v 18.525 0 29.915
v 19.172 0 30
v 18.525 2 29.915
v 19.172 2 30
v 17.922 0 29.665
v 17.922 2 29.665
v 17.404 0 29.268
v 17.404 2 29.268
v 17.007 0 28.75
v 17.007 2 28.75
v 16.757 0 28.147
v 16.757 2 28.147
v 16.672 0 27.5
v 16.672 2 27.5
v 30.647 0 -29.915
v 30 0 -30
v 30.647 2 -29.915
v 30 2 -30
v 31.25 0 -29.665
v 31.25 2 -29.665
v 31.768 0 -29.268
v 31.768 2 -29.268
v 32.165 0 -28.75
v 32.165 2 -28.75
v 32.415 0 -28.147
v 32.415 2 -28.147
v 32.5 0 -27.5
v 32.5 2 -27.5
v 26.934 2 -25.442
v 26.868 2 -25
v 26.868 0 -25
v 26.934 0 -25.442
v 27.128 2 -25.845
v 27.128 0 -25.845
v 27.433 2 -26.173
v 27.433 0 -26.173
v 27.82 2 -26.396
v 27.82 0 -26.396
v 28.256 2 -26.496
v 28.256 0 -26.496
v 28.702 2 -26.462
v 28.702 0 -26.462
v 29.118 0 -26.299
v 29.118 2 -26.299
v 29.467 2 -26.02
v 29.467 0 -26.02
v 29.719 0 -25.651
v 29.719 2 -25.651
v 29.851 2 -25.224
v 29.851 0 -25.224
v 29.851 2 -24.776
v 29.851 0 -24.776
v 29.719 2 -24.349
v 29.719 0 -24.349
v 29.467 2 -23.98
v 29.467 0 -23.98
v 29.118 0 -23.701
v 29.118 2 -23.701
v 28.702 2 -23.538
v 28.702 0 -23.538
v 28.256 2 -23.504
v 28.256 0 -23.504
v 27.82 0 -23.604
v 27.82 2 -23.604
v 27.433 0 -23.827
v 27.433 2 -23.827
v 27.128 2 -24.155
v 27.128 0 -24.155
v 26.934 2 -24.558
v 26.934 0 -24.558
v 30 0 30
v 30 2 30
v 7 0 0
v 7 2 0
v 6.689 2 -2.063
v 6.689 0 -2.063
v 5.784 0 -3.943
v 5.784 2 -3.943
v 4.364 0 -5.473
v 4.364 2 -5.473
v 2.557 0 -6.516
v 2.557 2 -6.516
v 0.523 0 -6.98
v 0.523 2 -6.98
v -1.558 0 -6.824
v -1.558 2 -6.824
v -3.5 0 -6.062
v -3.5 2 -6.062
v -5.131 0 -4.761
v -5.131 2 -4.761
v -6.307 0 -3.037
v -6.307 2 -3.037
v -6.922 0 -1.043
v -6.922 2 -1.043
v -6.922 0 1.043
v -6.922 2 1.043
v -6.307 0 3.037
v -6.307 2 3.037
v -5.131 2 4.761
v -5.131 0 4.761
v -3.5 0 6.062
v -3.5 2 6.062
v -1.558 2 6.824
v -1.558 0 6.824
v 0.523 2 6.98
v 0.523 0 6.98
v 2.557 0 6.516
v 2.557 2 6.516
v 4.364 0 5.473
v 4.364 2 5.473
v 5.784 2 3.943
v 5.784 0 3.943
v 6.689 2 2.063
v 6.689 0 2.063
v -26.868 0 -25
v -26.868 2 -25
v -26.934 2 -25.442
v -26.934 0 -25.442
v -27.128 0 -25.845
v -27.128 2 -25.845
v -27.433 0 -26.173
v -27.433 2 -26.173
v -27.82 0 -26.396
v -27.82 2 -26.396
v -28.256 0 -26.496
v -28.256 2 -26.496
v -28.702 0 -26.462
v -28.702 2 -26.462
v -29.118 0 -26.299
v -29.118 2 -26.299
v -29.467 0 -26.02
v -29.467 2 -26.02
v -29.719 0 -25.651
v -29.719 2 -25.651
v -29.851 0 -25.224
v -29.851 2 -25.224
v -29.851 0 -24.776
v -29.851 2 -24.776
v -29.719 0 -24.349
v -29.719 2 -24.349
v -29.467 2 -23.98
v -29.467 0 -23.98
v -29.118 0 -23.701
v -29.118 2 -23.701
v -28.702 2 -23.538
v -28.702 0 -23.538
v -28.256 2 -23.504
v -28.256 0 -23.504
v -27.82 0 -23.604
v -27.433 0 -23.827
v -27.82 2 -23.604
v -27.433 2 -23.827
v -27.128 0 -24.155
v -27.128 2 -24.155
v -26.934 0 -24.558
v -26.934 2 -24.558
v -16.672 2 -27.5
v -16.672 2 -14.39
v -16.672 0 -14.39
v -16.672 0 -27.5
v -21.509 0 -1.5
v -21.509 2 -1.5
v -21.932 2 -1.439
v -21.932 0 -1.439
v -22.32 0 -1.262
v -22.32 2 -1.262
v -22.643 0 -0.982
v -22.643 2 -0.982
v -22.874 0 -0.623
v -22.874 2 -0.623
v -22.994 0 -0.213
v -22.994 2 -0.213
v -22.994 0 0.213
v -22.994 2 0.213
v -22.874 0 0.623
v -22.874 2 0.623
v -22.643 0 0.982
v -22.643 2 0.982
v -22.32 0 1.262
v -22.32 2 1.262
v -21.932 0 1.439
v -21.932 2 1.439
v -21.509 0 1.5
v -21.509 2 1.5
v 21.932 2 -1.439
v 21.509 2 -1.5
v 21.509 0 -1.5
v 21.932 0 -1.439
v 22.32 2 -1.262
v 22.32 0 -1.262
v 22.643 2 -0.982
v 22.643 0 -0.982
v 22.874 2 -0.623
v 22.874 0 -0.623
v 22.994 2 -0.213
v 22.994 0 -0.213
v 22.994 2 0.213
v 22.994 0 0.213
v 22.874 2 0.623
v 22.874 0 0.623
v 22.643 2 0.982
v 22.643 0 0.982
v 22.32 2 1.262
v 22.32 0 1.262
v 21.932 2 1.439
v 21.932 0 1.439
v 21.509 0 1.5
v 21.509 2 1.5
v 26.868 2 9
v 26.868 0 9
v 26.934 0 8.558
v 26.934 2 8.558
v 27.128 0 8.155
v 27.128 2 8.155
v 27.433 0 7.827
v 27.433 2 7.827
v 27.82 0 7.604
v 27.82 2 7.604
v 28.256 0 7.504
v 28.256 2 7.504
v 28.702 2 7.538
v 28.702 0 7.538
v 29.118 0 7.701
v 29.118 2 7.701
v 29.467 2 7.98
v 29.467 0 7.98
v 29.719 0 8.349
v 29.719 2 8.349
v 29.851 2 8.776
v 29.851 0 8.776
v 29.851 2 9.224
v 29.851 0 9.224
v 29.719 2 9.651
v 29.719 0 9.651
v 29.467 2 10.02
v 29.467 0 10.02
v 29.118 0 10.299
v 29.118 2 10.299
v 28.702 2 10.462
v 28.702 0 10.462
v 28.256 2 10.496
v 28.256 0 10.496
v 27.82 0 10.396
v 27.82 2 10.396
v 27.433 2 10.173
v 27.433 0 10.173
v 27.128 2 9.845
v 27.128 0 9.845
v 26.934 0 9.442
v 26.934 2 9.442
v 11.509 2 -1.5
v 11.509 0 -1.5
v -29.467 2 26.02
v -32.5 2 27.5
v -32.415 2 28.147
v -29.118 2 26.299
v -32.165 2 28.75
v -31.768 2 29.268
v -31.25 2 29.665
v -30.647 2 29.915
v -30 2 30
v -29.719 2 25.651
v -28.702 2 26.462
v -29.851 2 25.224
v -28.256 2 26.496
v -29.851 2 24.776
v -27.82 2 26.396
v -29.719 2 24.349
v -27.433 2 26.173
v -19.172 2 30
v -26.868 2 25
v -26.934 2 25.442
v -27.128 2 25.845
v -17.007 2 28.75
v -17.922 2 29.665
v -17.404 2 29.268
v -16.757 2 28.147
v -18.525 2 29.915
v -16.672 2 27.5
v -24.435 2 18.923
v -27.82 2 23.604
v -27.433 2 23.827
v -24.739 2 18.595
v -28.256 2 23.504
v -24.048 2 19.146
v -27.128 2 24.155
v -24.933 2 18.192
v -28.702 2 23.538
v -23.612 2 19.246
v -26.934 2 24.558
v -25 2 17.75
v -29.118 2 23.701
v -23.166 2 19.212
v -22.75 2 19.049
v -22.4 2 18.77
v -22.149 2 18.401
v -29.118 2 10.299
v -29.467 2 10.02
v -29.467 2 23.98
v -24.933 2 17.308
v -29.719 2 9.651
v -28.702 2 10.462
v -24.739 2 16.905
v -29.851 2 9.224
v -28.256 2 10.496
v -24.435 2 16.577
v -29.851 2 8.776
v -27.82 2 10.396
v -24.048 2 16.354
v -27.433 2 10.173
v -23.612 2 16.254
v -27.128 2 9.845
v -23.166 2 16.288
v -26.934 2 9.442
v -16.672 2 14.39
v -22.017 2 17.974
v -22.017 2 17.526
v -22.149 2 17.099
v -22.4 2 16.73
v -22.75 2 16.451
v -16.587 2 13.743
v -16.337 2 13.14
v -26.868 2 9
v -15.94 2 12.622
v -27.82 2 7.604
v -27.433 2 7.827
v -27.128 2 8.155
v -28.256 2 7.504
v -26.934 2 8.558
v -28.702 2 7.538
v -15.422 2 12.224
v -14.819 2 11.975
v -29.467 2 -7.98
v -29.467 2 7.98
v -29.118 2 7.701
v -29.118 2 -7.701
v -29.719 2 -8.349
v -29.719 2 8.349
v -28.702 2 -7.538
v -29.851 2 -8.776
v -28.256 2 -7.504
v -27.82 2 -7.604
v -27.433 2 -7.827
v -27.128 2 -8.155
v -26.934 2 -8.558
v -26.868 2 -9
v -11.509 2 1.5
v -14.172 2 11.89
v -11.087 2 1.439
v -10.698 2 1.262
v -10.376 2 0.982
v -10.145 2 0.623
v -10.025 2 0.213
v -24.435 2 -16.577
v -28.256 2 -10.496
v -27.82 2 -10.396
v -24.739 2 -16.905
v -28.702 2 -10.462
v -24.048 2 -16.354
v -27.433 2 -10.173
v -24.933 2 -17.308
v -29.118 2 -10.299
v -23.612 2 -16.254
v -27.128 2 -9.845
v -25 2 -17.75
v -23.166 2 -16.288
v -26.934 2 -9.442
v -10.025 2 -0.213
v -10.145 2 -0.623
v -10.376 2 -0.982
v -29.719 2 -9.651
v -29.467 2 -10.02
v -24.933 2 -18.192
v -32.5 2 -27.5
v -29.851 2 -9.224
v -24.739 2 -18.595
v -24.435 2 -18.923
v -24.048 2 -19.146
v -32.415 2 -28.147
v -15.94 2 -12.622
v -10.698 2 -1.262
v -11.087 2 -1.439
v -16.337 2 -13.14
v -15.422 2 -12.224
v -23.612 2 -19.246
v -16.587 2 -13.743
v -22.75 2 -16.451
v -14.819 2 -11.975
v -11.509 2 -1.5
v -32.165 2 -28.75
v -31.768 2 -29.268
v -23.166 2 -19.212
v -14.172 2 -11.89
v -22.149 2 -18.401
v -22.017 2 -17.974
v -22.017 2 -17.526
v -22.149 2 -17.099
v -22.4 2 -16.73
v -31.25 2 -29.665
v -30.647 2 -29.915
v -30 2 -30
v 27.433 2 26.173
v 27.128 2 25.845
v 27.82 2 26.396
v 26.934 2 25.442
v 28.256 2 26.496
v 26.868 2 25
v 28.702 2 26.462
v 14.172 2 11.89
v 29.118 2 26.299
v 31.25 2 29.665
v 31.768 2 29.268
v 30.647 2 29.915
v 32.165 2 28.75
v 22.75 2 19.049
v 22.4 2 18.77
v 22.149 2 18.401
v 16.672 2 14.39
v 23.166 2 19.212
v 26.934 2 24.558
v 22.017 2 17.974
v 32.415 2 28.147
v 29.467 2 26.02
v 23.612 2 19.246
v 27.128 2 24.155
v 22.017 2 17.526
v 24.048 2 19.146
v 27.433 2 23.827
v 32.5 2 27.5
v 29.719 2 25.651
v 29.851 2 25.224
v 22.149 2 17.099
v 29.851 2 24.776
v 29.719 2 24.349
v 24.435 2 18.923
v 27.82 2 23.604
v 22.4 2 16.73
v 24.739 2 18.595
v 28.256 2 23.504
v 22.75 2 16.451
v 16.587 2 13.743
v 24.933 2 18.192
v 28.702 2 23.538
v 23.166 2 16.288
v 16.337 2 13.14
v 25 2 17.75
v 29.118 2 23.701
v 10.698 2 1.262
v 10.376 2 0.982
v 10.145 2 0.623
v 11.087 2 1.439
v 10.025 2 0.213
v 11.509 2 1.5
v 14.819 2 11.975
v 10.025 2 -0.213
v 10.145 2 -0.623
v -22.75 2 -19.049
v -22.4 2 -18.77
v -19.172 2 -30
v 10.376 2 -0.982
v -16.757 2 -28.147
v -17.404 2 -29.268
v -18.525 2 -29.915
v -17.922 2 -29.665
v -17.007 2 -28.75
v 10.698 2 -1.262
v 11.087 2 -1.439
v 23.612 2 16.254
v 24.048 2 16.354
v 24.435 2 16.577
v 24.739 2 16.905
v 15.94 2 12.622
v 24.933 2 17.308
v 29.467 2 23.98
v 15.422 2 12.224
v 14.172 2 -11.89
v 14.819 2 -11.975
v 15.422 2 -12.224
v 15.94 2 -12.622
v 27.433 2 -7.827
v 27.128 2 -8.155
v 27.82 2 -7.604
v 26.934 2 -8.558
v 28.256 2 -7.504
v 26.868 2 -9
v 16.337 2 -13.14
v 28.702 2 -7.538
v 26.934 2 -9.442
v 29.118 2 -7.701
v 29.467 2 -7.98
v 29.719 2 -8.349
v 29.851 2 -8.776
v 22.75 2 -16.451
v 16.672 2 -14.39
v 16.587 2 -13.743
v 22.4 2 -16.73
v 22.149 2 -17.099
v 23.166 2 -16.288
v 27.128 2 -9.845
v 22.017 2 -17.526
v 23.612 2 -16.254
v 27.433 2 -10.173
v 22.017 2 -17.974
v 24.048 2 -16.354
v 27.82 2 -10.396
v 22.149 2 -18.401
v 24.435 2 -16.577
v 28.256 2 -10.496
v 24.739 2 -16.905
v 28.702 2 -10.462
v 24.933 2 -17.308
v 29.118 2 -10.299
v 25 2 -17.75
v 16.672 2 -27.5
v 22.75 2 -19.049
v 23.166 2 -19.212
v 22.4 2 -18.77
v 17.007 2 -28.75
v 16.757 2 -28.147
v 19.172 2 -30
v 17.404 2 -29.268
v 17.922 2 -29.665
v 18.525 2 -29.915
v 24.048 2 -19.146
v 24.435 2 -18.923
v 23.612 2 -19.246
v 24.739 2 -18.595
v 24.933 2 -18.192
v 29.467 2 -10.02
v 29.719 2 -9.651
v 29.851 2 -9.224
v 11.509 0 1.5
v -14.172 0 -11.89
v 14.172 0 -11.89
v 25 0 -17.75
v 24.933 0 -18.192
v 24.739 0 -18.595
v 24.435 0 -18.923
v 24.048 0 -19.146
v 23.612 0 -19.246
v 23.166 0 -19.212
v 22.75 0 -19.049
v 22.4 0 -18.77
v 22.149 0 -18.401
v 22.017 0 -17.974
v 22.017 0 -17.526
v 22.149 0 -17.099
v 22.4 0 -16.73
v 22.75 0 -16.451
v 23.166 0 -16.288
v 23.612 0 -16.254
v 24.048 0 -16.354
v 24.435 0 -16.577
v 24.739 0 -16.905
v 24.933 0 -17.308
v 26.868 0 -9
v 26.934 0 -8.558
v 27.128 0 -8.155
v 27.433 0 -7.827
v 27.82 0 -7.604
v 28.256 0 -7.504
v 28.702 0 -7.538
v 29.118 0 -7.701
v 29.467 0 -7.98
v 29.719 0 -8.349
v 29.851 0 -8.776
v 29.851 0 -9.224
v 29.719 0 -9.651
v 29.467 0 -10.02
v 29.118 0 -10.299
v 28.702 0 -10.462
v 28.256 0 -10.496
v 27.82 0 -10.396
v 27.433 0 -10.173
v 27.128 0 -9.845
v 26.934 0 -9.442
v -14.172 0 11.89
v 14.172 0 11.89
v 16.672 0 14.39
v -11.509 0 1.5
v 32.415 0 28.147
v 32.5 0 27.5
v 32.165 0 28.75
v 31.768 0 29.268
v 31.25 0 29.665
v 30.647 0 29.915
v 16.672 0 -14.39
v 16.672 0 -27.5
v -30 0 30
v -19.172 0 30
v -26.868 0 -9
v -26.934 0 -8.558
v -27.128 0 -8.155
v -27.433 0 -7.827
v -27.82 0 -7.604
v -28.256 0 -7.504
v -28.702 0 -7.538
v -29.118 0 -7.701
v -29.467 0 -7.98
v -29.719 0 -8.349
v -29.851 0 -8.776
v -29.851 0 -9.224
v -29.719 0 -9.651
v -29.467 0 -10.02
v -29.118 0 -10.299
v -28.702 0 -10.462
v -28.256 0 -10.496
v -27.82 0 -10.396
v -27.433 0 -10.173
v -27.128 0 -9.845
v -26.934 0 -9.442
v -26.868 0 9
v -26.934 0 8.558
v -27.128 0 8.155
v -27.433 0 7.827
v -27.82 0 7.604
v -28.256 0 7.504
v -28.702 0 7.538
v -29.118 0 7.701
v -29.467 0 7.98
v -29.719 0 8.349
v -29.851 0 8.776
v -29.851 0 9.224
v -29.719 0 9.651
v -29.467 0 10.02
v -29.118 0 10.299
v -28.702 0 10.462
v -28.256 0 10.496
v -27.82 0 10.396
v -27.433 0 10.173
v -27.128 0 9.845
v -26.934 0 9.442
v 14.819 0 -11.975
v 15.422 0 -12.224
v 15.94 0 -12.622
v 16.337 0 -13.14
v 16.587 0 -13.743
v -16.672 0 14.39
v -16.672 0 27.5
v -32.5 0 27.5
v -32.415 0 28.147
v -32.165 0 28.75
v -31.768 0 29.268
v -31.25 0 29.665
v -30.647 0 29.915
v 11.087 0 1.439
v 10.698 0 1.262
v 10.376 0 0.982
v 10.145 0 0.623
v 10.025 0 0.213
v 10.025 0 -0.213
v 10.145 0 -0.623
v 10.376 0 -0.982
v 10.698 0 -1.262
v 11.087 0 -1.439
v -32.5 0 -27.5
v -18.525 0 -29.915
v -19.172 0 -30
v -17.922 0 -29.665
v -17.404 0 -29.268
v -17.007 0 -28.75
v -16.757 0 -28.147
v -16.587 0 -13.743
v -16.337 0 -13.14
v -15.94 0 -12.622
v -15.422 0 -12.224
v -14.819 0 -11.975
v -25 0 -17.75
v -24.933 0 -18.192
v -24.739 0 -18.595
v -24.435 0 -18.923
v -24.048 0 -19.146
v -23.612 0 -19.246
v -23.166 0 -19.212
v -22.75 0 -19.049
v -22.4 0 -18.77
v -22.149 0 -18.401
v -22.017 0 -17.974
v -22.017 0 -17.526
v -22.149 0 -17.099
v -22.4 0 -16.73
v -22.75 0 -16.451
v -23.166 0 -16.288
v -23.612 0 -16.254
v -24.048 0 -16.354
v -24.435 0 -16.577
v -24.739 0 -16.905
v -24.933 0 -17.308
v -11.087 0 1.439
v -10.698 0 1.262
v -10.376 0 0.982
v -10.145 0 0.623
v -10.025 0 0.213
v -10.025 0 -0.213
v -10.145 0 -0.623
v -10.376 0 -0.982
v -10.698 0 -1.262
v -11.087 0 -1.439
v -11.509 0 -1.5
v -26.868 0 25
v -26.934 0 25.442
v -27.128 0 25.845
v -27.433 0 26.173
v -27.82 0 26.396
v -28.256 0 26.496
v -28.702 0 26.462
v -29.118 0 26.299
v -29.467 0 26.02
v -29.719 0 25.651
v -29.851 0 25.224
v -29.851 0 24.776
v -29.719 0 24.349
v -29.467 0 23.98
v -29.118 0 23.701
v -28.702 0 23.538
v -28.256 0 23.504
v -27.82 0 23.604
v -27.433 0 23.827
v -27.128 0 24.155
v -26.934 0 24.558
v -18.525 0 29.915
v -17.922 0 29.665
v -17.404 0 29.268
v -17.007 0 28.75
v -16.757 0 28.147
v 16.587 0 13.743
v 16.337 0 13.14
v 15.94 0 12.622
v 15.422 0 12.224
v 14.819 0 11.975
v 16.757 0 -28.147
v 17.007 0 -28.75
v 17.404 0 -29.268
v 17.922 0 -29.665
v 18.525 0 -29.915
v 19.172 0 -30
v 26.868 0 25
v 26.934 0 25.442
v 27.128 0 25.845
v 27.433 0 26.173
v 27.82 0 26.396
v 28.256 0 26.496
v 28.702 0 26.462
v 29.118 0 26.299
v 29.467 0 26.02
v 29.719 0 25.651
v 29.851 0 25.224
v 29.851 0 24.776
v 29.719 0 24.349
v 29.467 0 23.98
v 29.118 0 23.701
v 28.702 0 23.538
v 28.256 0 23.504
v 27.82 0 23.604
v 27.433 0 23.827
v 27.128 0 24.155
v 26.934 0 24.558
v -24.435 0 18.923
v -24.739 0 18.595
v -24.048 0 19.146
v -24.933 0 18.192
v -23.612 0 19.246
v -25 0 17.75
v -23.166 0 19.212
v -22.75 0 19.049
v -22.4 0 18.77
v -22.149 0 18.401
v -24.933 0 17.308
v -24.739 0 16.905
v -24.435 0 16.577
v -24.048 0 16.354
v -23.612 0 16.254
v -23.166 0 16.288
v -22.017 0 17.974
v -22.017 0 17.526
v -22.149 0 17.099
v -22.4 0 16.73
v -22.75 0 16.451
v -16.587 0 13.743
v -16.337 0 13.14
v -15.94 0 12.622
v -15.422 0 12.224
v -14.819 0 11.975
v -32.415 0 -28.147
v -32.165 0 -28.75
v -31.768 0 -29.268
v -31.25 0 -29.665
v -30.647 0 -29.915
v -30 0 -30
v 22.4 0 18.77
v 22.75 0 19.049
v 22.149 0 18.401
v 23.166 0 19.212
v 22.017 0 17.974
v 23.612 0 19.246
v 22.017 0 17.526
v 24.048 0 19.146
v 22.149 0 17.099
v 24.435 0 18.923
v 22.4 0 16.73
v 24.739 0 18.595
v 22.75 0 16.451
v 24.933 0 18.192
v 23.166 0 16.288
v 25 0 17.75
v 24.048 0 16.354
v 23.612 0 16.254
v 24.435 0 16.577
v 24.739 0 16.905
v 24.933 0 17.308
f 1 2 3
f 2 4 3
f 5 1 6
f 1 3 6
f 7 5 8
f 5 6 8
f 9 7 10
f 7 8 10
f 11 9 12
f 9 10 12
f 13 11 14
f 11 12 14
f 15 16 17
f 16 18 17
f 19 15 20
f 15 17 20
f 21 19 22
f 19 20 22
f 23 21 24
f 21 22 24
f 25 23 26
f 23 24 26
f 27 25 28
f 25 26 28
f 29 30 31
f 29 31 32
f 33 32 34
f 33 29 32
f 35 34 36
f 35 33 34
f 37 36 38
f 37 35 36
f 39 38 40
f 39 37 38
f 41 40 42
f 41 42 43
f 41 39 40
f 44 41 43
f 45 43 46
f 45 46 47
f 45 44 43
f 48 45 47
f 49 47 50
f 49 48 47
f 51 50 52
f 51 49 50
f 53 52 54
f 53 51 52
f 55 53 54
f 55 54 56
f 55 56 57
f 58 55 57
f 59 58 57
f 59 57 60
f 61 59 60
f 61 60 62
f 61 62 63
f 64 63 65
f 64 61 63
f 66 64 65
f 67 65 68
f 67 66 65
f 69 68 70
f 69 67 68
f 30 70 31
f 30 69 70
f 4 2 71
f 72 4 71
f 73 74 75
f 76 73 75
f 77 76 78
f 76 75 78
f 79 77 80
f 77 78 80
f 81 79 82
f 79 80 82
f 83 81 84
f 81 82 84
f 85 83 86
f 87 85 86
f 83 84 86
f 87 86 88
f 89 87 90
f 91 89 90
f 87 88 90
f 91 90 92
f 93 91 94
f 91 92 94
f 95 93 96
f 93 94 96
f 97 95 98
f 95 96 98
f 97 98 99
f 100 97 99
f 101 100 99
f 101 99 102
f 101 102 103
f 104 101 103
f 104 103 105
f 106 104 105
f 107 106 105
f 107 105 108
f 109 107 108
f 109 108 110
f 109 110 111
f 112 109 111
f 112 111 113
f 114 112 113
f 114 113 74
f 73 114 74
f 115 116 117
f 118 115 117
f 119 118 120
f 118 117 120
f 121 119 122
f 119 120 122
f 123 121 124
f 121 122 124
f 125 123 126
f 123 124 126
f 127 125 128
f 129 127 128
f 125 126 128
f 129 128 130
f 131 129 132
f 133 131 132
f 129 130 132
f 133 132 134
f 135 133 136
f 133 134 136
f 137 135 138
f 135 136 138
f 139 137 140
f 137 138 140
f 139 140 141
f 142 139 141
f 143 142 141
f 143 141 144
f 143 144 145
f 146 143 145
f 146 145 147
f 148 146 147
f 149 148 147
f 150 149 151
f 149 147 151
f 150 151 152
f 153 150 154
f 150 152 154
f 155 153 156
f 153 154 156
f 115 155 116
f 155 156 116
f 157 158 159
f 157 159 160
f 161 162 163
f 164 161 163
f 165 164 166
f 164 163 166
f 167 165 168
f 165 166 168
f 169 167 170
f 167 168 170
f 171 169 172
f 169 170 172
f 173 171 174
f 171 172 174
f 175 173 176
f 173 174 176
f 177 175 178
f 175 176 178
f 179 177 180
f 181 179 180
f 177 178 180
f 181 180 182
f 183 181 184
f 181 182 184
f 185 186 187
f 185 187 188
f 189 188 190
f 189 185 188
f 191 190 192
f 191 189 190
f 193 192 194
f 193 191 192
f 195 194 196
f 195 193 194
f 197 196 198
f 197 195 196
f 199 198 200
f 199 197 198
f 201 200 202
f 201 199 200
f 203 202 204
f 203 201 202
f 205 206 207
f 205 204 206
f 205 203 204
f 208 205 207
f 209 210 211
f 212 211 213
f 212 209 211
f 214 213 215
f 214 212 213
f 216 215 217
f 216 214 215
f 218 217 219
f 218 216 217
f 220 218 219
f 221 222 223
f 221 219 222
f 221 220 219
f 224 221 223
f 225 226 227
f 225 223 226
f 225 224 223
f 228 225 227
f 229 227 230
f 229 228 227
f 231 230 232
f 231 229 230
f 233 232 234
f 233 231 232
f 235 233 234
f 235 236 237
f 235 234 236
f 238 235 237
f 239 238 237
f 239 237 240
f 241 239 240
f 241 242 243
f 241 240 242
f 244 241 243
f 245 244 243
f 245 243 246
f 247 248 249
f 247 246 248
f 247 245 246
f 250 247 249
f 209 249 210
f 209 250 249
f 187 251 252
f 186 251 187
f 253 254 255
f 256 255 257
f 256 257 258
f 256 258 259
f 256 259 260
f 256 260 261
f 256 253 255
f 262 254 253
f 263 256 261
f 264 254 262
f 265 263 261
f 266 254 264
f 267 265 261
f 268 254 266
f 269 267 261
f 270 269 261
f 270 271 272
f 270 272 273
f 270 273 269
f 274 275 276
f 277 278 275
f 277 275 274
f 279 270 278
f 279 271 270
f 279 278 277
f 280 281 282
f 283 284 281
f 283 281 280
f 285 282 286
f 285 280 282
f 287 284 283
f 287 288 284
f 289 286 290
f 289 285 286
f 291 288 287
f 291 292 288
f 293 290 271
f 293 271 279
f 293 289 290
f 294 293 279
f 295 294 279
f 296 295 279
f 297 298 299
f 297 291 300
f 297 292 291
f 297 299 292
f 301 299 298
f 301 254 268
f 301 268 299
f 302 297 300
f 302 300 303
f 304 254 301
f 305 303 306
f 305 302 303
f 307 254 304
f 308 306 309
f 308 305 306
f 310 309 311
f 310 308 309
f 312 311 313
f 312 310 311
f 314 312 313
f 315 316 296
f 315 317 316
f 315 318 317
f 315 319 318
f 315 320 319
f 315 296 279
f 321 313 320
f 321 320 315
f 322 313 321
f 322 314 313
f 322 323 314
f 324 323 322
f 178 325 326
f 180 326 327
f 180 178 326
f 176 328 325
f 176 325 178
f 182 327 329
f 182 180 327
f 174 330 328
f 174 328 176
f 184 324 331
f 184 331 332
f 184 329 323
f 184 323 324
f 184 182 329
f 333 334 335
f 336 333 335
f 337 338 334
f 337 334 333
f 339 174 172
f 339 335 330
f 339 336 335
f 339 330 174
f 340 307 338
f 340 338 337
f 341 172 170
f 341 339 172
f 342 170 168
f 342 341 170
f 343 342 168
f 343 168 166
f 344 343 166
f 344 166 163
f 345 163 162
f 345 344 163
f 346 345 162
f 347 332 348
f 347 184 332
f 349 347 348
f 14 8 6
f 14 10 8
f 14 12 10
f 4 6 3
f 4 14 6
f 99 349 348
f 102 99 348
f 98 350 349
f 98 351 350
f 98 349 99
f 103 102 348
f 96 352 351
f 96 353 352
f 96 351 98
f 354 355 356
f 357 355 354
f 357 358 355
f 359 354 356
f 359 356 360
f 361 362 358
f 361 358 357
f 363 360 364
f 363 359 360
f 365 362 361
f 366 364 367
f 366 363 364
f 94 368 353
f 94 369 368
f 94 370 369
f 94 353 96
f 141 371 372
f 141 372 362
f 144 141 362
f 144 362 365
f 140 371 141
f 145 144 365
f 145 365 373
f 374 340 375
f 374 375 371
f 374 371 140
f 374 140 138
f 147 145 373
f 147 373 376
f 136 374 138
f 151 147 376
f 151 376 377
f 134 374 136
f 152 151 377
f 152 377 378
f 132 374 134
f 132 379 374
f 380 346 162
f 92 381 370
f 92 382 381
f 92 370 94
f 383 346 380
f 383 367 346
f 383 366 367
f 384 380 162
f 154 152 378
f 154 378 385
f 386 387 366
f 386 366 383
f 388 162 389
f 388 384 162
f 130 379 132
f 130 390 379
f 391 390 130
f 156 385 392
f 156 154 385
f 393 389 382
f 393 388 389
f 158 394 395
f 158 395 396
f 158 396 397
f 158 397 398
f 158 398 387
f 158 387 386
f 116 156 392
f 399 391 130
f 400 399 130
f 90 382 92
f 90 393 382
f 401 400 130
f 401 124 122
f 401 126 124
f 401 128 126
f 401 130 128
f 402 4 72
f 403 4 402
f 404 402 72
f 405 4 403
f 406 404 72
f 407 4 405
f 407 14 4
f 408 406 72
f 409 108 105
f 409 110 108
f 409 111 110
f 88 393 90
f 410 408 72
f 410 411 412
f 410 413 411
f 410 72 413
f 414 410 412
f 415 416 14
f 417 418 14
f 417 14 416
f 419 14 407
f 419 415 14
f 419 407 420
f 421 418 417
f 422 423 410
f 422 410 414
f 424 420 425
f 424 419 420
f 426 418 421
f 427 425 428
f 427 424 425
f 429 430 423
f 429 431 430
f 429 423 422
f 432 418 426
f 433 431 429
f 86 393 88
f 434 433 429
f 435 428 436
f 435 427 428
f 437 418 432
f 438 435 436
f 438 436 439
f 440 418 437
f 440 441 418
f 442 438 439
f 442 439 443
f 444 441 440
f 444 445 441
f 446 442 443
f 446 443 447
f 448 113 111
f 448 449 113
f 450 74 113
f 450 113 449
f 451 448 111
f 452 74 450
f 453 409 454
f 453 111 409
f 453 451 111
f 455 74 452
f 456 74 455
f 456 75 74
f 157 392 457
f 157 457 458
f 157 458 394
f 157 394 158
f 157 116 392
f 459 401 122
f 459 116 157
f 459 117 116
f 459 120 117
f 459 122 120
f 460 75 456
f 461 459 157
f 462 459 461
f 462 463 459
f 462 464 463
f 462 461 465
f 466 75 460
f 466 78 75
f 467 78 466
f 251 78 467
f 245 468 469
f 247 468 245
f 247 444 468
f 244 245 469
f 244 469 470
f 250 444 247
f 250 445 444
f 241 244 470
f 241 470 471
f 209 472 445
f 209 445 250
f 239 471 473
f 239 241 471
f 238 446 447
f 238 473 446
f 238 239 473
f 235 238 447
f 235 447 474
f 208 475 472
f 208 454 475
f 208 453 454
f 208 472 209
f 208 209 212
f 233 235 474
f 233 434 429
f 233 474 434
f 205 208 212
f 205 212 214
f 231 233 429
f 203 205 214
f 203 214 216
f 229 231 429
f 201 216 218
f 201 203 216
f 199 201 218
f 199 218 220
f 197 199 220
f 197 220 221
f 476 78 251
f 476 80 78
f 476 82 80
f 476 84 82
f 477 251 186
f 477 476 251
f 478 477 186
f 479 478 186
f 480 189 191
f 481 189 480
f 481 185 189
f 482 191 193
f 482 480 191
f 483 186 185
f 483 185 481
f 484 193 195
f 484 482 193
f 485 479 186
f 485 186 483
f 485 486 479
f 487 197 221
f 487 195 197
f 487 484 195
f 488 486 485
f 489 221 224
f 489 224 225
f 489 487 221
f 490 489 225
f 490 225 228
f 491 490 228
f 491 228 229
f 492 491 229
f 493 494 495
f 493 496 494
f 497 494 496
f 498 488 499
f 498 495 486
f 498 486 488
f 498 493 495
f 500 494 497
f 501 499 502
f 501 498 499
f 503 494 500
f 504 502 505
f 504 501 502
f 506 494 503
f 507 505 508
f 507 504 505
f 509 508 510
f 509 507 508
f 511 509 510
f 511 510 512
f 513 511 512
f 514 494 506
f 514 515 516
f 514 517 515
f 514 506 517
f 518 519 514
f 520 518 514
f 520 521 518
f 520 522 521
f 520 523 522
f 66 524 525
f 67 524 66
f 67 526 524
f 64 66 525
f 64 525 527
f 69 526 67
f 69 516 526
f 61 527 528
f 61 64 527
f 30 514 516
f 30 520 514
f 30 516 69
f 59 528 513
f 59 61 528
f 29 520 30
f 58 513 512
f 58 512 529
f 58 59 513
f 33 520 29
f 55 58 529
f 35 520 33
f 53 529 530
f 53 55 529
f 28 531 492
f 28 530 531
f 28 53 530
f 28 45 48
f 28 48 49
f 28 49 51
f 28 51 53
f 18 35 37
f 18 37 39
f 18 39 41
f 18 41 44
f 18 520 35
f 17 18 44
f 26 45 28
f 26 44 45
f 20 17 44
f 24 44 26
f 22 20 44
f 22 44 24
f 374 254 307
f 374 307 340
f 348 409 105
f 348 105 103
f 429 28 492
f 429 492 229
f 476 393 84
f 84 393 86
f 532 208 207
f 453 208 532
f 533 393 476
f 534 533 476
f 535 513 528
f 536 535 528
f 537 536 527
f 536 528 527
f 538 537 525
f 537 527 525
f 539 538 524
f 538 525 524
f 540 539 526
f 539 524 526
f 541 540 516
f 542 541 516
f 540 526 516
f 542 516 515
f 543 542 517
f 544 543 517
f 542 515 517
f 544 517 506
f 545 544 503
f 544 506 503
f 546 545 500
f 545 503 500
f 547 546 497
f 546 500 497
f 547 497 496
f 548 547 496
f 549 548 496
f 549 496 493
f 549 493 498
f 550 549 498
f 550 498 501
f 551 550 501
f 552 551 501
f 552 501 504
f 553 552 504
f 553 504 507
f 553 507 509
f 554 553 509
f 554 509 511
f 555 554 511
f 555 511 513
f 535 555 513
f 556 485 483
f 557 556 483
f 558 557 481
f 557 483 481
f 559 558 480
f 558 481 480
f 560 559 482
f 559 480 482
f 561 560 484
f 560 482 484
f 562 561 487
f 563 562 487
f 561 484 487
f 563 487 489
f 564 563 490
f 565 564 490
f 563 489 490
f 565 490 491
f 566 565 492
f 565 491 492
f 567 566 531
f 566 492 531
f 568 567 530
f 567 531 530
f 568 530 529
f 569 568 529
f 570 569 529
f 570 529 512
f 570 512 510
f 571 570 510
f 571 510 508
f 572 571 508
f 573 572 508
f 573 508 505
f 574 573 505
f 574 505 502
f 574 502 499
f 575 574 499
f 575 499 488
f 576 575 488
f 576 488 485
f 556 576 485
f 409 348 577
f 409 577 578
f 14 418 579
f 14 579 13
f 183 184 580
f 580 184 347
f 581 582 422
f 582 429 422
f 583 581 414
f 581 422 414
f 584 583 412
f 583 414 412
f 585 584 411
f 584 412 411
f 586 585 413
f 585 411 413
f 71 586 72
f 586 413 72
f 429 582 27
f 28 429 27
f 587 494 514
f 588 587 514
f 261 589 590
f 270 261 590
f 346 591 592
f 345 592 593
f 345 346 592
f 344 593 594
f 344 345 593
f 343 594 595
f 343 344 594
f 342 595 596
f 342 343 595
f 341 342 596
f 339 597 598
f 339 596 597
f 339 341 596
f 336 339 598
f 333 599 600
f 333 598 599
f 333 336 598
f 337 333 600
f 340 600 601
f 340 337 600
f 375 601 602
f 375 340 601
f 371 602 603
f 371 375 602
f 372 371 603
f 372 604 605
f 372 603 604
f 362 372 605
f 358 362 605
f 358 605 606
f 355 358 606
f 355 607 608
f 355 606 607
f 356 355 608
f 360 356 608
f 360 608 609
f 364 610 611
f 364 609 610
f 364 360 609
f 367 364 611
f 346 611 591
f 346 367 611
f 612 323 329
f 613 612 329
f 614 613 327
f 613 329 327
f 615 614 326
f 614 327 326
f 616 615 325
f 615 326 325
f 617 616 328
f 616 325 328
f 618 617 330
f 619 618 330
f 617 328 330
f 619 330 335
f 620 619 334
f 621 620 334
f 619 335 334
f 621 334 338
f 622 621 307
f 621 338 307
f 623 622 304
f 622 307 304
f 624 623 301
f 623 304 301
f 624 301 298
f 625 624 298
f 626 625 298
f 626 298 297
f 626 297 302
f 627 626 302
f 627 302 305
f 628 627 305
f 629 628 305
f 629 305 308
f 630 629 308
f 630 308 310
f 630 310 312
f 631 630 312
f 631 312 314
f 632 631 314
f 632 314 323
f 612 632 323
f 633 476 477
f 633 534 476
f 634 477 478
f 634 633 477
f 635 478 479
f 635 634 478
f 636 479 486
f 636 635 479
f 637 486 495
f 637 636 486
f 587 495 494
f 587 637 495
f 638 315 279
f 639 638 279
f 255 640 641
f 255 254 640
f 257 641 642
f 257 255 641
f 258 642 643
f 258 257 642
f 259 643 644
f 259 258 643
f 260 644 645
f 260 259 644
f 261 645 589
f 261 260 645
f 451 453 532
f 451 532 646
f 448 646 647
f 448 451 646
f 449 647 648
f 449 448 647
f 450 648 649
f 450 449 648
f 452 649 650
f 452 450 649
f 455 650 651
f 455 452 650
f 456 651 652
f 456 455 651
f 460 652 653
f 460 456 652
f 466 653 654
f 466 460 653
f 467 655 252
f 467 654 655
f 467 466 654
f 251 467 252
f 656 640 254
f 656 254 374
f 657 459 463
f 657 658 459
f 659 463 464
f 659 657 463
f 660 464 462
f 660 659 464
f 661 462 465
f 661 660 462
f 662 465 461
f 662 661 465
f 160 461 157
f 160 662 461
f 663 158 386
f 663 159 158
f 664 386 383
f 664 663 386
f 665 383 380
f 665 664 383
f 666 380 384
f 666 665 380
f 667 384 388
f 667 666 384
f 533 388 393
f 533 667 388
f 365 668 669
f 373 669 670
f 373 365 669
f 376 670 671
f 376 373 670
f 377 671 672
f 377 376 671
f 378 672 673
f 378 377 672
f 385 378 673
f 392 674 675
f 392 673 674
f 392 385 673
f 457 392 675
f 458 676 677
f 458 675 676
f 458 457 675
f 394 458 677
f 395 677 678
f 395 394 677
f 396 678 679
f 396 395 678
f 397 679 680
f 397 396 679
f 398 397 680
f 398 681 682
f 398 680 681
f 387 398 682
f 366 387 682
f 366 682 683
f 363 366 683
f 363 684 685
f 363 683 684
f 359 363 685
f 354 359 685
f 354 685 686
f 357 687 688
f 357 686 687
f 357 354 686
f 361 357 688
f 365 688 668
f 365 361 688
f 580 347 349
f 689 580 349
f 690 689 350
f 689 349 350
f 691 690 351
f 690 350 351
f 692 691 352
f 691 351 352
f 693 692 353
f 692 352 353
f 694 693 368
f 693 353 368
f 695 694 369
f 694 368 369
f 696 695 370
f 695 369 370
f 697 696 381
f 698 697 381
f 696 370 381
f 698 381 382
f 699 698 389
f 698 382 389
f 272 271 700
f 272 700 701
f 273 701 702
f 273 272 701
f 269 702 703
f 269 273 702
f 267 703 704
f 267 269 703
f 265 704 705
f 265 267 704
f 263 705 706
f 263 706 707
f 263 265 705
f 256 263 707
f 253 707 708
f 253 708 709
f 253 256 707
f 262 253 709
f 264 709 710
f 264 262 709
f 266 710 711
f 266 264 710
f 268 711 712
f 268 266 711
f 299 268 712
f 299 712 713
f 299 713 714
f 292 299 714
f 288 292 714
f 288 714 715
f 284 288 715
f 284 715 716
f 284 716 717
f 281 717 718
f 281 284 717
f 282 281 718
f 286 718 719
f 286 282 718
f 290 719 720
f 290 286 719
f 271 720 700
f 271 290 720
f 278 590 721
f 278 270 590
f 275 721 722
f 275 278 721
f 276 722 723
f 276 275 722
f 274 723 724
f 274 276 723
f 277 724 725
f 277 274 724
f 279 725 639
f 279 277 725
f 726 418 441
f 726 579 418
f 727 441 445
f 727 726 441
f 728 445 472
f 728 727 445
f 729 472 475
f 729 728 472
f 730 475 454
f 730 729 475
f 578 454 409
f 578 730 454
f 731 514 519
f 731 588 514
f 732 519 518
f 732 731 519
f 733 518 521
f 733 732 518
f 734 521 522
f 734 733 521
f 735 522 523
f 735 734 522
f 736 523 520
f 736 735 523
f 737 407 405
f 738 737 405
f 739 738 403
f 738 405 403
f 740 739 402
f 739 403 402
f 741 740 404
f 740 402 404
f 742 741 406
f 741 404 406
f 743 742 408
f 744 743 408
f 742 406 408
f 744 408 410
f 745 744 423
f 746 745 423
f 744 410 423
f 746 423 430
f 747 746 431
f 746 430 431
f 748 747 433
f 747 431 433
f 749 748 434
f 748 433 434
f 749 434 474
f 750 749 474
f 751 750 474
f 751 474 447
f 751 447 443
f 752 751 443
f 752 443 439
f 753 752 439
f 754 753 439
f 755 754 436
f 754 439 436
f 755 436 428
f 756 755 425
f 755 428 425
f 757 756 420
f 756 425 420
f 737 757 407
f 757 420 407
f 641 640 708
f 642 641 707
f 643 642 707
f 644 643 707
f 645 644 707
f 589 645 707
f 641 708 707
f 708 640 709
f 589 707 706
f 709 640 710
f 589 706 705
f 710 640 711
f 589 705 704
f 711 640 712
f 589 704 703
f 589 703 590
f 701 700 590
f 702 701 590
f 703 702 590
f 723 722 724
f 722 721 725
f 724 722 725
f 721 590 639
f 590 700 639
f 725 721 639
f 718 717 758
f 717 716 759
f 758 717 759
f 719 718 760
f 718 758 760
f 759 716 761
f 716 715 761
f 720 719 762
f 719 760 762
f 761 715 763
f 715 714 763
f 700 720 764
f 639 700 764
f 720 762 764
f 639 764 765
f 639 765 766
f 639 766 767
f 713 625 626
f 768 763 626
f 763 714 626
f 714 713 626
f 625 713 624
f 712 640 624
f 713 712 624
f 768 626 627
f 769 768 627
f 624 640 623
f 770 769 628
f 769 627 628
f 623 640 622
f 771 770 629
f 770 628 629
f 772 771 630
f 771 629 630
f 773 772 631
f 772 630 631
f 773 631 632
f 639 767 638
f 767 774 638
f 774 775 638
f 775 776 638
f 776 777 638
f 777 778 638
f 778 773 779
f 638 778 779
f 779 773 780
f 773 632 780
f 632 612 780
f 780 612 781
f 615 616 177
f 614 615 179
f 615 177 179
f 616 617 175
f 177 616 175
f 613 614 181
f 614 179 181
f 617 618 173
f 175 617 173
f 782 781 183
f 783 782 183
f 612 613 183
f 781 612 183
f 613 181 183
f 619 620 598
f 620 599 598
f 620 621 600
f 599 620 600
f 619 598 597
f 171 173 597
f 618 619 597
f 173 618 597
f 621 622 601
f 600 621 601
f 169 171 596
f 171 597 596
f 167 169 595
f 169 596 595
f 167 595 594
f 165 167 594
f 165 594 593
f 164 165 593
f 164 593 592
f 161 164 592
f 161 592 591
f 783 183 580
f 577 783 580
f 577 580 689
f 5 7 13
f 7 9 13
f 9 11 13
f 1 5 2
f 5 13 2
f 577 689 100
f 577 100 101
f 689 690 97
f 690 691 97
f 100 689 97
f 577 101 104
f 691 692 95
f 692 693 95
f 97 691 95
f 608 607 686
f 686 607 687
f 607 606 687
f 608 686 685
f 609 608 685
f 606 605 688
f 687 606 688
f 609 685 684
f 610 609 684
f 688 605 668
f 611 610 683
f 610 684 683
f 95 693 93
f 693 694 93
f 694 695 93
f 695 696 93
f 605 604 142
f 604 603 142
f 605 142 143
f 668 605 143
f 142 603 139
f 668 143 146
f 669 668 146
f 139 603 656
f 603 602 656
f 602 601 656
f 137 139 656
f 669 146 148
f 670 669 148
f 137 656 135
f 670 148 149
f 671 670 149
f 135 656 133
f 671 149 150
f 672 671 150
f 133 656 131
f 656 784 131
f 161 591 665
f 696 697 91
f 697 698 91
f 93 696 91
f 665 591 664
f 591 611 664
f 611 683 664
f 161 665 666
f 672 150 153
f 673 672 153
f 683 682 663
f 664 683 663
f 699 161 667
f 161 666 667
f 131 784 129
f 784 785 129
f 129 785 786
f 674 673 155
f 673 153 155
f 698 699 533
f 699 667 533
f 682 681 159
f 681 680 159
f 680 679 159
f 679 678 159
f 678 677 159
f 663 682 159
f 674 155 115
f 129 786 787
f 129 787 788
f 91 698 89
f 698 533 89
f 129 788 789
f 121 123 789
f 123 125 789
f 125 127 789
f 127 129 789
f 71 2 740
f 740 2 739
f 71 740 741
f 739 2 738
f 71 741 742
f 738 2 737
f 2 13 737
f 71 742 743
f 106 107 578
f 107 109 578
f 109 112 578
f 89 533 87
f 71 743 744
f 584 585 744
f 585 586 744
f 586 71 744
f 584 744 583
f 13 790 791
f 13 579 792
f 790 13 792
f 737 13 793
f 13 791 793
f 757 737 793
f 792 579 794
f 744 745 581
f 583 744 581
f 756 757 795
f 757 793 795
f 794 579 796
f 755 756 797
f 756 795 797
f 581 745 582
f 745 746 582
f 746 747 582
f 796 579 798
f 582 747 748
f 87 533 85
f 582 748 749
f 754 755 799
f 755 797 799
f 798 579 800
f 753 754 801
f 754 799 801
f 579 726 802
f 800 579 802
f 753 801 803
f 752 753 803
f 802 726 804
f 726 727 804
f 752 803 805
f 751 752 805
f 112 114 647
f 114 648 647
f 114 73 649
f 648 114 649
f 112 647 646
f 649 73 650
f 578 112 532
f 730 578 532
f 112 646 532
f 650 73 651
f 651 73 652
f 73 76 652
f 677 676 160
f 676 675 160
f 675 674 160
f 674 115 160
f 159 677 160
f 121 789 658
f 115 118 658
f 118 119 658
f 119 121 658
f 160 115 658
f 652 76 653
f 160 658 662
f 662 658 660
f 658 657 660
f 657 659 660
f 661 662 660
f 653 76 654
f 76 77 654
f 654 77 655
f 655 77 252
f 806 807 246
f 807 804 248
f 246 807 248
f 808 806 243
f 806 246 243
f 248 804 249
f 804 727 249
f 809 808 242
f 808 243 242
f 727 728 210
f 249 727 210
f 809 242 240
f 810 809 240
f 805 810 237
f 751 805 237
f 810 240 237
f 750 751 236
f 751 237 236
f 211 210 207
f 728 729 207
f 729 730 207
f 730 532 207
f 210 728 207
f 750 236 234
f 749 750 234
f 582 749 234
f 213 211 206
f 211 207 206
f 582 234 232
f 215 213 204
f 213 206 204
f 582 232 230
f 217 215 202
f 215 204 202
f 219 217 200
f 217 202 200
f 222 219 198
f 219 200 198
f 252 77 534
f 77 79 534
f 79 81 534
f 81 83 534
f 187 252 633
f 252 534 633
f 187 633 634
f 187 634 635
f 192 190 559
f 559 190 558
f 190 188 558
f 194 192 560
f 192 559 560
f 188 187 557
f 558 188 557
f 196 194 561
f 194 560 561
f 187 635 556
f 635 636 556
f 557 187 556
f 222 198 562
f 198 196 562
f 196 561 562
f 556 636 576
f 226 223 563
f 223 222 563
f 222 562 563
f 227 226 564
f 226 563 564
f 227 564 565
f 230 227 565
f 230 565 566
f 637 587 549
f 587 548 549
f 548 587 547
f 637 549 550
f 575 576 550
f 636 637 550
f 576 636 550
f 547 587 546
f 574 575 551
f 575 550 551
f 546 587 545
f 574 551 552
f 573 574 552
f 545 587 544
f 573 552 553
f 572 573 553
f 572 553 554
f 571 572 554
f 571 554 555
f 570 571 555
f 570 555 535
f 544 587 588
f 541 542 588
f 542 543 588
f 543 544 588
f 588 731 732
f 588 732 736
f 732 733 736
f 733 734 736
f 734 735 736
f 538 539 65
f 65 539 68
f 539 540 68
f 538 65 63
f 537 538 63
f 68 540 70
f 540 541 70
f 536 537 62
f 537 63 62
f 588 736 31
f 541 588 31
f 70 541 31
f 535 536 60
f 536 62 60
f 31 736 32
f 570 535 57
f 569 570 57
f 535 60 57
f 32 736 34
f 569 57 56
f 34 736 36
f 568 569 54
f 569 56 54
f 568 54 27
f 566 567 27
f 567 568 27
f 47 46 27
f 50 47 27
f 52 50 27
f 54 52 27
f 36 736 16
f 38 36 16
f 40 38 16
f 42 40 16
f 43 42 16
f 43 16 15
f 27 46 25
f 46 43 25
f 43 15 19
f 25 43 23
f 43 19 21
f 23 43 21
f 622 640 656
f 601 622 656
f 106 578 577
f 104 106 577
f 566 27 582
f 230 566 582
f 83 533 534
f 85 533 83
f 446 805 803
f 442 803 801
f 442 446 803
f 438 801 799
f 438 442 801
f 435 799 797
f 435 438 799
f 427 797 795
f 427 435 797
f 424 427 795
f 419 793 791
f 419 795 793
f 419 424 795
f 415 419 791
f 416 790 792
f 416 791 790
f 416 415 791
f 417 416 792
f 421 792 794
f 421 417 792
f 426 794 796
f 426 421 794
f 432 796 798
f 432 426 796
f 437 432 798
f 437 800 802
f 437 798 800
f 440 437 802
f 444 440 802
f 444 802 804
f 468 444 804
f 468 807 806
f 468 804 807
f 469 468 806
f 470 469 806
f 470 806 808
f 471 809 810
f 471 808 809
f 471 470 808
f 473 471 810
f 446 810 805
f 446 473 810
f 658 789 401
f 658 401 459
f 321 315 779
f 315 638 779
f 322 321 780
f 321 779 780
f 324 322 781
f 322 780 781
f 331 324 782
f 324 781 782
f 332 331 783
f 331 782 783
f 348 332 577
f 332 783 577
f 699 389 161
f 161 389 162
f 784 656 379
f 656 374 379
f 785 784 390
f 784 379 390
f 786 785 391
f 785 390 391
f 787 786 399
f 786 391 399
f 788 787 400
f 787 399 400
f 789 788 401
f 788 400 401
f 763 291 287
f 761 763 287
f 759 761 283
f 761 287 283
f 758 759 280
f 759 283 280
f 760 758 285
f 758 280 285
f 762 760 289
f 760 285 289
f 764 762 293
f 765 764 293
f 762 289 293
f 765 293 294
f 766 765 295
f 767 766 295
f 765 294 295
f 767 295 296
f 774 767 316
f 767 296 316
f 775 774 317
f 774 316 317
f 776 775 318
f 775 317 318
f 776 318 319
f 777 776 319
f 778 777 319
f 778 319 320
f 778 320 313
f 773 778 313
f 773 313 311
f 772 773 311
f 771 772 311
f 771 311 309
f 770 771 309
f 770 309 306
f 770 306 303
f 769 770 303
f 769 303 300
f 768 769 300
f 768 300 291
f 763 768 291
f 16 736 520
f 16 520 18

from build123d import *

# Parameters (mm, degrees)
SKETCH_1_W                = 65
SKETCH_1_H                = 60
EXTRUDE_1_DEPTH           = 2
SKETCH_2_R                = 1.5
CUT_EXTRUDE_1_DEPTH       = 2
SKETCH_5_R                = 7
CUT_EXTRUDE_4_DEPTH       = 3
SKETCH_6_R                = 1.5
CUT_EXTRUDE_5_DEPTH       = 3
CUT_EXTRUDE_6_DEPTH       = 3
SKETCH_8_R                = 1.5
CUT_EXTRUDE_7_DEPTH       = 3
MIRROR_8_COPY_1_SKETCH_R  = 1.5
MIRROR_8_COPY_1_DEPTH     = 3
MIRROR_10_COPY_1_SKETCH_R = 1.5
MIRROR_10_COPY_1_DEPTH    = 2
MIRROR_10_COPY_2_SKETCH_R = 1.5
MIRROR_10_COPY_2_DEPTH    = 3
SKETCH_9_W                = 33.344360542
SKETCH_9_H                = 36.22087855
CUT_EXTRUDE_8_DEPTH       = 3
FILLET_1_R                = 2.5


with BuildPart() as part:
    # 草图1 → 凸台-拉伸1 (new body)
    with BuildSketch(Plane(origin=(0, 0, 0), x_dir=(1, 0, 0), z_dir=(0, 1, 0))):
        Rectangle(SKETCH_1_W, SKETCH_1_H)
    extrude(amount=EXTRUDE_1_DEPTH)

    # 草图2 → 切除-拉伸1 (cut)
    with BuildSketch(Plane(origin=(0, 2, 0), x_dir=(1, 0, 0), z_dir=(0, 1, 0))):
        with Locations((-28.367832783, 25)):
            Circle(SKETCH_2_R)
    cut_extrude_1 = extrude(amount=-CUT_EXTRUDE_1_DEPTH, mode=Mode.SUBTRACT)

    # 草图5 → 切除-拉伸4 (cut, through all)
    with BuildSketch(Plane(origin=(0, 2, 0), x_dir=(1, 0, 0), z_dir=(0, 1, 0))):
        Circle(SKETCH_5_R)
    extrude(amount=-CUT_EXTRUDE_4_DEPTH, mode=Mode.SUBTRACT)

    # 草图6 → 切除-拉伸5 (cut, through all)
    with BuildSketch(Plane(origin=(0, 2, 0), x_dir=(1, 0, 0), z_dir=(0, 1, 0))):
        with Locations((-28.367832783, -9)):
            Circle(SKETCH_6_R)
    cut_extrude_5 = extrude(amount=-CUT_EXTRUDE_5_DEPTH, mode=Mode.SUBTRACT)

    # 镜向7: 切除-拉伸5 across plane
    add(cut_extrude_5.mirror(Plane.XY), mode=Mode.SUBTRACT)

    # 草图7 → 切除-拉伸6 (cut, through all)
    with BuildSketch(Plane(origin=(0, 2, 0), x_dir=(1, 0, 0), z_dir=(0, 1, 0))):
        with BuildLine():
            Line((-11.509285997, 1.5), (-21.509285997, 1.5))
            ThreePointArc((-21.509285997, 1.5), (-23.009285997, 0), (-21.509285997, -1.5))
            Line((-21.509285997, -1.5), (-11.509285997, -1.5))
            ThreePointArc((-11.509285997, -1.5), (-10.009285997, 0), (-11.509285997, 1.5))
        make_face()
    cut_extrude_6 = extrude(amount=-CUT_EXTRUDE_6_DEPTH, mode=Mode.SUBTRACT)

    # 草图8 → 切除-拉伸7 (cut, through all)
    with BuildSketch(Plane(origin=(0, 2, 0), x_dir=(1, 0, 0), z_dir=(0, 1, 0))):
        with Locations((23.5, 17.75)):
            Circle(SKETCH_8_R)
    cut_extrude_7 = extrude(amount=-CUT_EXTRUDE_7_DEPTH, mode=Mode.SUBTRACT)

    # 镜向8: 切除-拉伸6, 切除-拉伸5 across plane
    add(cut_extrude_6.mirror(Plane(origin=(0, 0, 0), x_dir=(0, 0, 1), z_dir=(1, 0, 0))), mode=Mode.SUBTRACT)
    add(cut_extrude_5.mirror(Plane(origin=(0, 0, 0), x_dir=(0, 0, 1), z_dir=(1, 0, 0))), mode=Mode.SUBTRACT)

    # 镜向8 copy 1 sketch → 镜向8 copy 1 (cut, through all)
    with BuildSketch(Plane(origin=(0, 2, 0), x_dir=(-1, 0, 0), z_dir=(0, 1, 0))):
        with Locations((-28.367832783, -9)):
            Circle(MIRROR_8_COPY_1_SKETCH_R)
    extrude(amount=-MIRROR_8_COPY_1_DEPTH, mode=Mode.SUBTRACT)

    # 镜向9: 切除-拉伸1, 切除-拉伸7 across plane
    add(cut_extrude_1.mirror(Plane.XY), mode=Mode.SUBTRACT)
    add(cut_extrude_7.mirror(Plane.XY), mode=Mode.SUBTRACT)

    # 镜向10: 切除-拉伸1, 切除-拉伸7 across plane
    add(cut_extrude_1.mirror(Plane(origin=(0, 0, 0), x_dir=(0, 0, 1), z_dir=(1, 0, 0))), mode=Mode.SUBTRACT)
    add(cut_extrude_7.mirror(Plane(origin=(0, 0, 0), x_dir=(0, 0, 1), z_dir=(1, 0, 0))), mode=Mode.SUBTRACT)

    # 镜向10 copy 1 sketch → 镜向10 copy 1 (cut)
    with BuildSketch(Plane(origin=(0, 2, 0), x_dir=(-1, 0, 0), z_dir=(0, 1, 0))):
        with Locations((-28.367832783, 25)):
            Circle(MIRROR_10_COPY_1_SKETCH_R)
    extrude(amount=-MIRROR_10_COPY_1_DEPTH, mode=Mode.SUBTRACT)

    # 镜向10 copy 2 sketch → 镜向10 copy 2 (cut, through all)
    with BuildSketch(Plane(origin=(0, 2, 0), x_dir=(-1, 0, 0), z_dir=(0, 1, 0))):
        with Locations((23.5, 17.75)):
            Circle(MIRROR_10_COPY_2_SKETCH_R)
    extrude(amount=-MIRROR_10_COPY_2_DEPTH, mode=Mode.SUBTRACT)

    # 草图9 → 切除-拉伸8 (cut, through all)
    with BuildSketch(Plane(origin=(0, 2, 0), x_dir=(1, 0, 0), z_dir=(0, 1, 0))):
        with Locations((0, 30)):
            Rectangle(SKETCH_9_W, SKETCH_9_H)
    cut_extrude_8 = extrude(amount=-CUT_EXTRUDE_8_DEPTH, mode=Mode.SUBTRACT)

    # 镜向11: 切除-拉伸8 across plane
    add(cut_extrude_8.mirror(Plane.XY), mode=Mode.SUBTRACT)

    # 圆角1
    fillet_1_edges = [part.edges().sort_by_distance(p)[0] for p in [
        (16.672180271, 1, -30),
        (-16.672180271, 1, -30),
        (-16.672180271, 1, -11.889560725),
        (16.672180271, 1, -11.889560725),
        (16.672180271, 1, 30),
        (-16.672180271, 1, 30),
        (16.672180271, 1, 11.889560725),
        (-16.672180271, 1, 11.889560725),
        (-32.5, 1, -30),
        (32.5, 1, -30),
        (32.5, 1, 30),
        (-32.5, 1, 30),
    ]]
    fillet(fillet_1_edges, radius=FILLET_1_R)


solid = part.part
